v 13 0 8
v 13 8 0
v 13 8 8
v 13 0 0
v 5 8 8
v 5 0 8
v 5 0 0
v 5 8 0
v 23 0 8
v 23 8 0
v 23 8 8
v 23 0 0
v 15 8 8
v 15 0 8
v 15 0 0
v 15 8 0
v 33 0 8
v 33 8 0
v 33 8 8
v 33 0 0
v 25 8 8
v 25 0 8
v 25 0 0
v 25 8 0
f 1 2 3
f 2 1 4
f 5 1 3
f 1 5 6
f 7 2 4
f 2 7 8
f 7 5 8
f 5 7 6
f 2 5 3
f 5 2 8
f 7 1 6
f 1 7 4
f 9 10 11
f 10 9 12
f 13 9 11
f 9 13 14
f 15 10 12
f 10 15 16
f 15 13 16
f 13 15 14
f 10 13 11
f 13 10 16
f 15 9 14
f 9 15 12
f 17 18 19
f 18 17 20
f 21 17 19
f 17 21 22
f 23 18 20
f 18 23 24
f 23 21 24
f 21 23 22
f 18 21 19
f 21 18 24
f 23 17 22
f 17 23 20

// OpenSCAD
/*!
  Highlight an issue to keep in mind:
  If we first render (F6) the second line only:
    for (i=[0:2]) translate([i*10,0,0]) cube(8);
  and then the whole design:
    translate([5,0,0]) for (i=[0:2]) translate([i*10,0,0]) cube(8);

  ..the first for node was cached, but since the CGAL renderer cannot render GeometryList nodes, it failed.

  This was fixed by not caching ListNode instances.
*/

translate([5,0,0])
for (i=[0:2]) translate([i*10,0,0]) cube(8);
